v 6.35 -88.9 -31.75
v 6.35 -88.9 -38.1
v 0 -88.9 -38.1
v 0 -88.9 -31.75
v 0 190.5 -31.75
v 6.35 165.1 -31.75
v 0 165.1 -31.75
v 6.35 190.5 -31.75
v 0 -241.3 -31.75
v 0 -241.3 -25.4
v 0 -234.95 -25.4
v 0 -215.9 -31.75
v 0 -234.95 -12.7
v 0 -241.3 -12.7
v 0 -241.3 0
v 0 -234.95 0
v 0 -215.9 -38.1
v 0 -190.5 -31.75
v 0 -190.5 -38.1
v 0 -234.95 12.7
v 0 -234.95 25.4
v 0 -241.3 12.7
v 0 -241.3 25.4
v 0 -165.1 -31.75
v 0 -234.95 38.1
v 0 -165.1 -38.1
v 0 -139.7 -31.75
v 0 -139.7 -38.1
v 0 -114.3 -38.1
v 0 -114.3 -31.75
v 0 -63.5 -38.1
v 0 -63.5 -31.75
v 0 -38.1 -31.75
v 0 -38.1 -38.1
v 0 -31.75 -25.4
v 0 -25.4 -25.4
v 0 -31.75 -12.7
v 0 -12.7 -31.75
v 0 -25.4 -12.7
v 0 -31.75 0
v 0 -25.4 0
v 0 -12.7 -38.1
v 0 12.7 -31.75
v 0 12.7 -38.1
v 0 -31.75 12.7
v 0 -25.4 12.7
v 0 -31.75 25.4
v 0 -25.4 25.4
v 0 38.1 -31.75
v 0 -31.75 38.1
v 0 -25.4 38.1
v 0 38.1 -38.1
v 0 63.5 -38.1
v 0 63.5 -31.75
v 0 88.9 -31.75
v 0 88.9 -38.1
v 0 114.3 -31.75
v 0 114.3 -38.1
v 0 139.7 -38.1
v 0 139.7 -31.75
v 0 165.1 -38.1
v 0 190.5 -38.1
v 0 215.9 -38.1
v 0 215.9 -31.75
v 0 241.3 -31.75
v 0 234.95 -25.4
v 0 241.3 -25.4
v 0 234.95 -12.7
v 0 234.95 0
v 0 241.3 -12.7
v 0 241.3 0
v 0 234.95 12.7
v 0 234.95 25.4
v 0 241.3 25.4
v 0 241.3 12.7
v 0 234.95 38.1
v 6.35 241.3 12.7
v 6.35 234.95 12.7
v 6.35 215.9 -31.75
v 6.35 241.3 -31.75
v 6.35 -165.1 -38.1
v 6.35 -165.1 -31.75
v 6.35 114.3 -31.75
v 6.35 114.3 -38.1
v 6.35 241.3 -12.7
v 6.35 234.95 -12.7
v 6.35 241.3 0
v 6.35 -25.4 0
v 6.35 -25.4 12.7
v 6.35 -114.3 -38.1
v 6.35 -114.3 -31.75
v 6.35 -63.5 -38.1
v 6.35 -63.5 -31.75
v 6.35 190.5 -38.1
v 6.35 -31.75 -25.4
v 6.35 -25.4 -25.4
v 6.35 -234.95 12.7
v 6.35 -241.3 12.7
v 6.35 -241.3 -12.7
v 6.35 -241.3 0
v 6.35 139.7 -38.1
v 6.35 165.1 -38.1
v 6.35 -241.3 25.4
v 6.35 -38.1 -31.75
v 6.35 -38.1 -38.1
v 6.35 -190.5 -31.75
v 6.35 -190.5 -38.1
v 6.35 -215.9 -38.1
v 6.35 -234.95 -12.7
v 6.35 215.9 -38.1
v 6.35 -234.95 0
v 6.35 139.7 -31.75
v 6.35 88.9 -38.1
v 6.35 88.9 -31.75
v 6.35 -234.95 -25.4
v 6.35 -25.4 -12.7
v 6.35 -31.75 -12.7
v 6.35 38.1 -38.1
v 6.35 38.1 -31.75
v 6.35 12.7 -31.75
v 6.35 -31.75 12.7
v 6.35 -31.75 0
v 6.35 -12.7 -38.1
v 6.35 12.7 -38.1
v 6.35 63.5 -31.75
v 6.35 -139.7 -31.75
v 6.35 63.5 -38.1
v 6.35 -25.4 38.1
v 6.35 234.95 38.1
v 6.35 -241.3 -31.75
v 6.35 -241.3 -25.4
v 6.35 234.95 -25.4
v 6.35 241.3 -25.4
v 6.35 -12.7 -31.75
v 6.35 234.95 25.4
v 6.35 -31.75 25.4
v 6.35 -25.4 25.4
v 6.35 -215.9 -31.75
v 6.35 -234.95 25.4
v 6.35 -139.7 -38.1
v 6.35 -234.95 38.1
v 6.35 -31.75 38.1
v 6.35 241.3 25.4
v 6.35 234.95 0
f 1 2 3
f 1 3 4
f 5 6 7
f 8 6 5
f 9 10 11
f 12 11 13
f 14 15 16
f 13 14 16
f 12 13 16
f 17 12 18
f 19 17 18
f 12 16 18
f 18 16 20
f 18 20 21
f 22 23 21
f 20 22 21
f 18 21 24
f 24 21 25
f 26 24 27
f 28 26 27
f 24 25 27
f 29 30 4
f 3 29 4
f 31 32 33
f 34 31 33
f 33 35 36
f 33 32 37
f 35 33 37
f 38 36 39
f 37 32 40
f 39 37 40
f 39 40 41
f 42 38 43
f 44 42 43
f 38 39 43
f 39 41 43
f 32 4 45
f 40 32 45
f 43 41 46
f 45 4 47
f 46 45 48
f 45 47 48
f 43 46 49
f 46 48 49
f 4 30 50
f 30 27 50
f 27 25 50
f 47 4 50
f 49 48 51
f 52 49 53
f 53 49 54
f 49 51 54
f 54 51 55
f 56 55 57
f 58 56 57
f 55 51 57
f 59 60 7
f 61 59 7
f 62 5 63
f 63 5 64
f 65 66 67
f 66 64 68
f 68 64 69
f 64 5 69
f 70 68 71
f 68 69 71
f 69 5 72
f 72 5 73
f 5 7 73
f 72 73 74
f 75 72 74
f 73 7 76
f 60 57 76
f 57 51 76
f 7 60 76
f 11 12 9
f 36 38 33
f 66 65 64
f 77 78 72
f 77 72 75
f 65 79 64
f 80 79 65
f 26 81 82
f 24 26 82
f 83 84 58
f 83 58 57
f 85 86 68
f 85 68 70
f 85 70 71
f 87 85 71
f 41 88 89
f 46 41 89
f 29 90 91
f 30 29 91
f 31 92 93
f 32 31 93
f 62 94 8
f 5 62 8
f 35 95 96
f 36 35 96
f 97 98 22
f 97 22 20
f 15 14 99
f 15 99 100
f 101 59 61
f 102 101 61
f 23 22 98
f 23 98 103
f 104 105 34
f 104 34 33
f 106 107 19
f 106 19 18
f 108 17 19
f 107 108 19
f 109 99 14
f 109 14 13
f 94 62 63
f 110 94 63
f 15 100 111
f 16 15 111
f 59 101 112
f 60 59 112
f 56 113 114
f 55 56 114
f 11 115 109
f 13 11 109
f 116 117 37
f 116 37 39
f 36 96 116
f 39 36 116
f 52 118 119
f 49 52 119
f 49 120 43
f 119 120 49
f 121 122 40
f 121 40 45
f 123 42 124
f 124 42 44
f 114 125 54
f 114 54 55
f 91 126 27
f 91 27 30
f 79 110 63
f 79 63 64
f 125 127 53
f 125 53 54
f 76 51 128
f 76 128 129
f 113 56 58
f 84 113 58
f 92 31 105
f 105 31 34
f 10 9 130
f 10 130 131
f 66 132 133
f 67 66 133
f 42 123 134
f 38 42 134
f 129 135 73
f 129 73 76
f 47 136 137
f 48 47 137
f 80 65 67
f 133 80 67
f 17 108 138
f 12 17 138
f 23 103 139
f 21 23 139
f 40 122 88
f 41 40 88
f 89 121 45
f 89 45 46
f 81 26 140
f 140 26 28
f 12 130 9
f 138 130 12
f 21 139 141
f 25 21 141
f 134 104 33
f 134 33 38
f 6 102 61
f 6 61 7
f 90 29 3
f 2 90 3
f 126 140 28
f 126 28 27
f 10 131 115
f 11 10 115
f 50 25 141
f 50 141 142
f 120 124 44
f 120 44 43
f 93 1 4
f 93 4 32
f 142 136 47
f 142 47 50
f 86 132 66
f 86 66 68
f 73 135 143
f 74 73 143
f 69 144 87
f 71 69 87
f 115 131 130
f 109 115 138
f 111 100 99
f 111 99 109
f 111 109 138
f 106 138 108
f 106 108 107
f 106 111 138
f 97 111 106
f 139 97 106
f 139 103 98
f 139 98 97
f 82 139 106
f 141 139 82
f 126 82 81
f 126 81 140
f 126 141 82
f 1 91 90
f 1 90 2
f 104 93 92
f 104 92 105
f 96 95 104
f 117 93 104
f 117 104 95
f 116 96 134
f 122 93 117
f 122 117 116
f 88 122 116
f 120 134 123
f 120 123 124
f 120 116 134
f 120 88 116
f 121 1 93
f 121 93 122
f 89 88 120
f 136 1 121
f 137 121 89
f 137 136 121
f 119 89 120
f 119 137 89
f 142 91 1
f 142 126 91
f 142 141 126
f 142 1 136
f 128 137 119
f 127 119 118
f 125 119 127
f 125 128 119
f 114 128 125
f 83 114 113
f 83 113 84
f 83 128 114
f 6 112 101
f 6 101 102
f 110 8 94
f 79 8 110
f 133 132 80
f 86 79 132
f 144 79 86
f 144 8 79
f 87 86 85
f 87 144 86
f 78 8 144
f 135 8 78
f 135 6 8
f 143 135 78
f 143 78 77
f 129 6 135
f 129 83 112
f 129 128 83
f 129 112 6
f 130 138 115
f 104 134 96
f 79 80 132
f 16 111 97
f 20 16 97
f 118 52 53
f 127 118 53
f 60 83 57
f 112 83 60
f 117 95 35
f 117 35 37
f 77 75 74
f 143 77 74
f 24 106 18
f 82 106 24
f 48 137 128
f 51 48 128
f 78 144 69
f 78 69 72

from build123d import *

# Parameters (mm, degrees)
F0_W     = 482.6
F0_H     = 76.2
F1_DEPTH = 6.35
F2_W     = 25.4
F2_H     = 6.35
F3_DEPTH = 6.35
F4_W     = 6.35
F4_H     = 12.7
F5_DEPTH = 6.35


with BuildPart() as f1:
    # F0 (on Right) → F1 (new body)
    with BuildSketch(Plane.YZ):
        Rectangle(F0_W, F0_H)
    extrude(amount=F1_DEPTH)

    # F2 (on face) → F3 (cut, through all)
    with BuildSketch(Plane.YZ.offset(6.35)):
        with Locations((-228.6, -34.925)):
            Rectangle(F2_W, F2_H)
        with Locations((-177.8, -34.925)):
            Rectangle(F2_W, F2_H)
        with Locations((-127, -34.925)):
            Rectangle(F2_W, F2_H)
        with Locations((-76.2, -34.925)):
            Rectangle(F2_W, F2_H)
        with Locations((-25.4, -34.925)):
            Rectangle(F2_W, F2_H)
        with Locations((25.4, -34.925)):
            Rectangle(F2_W, F2_H)
        with Locations((76.2, -34.925)):
            Rectangle(F2_W, F2_H)
        with Locations((127, -34.925)):
            Rectangle(F2_W, F2_H)
        with Locations((177.8, -34.925)):
            Rectangle(F2_W, F2_H)
        with Locations((228.6, -34.925)):
            Rectangle(F2_W, F2_H)
    extrude(amount=-F3_DEPTH, mode=Mode.SUBTRACT)

    # F4 (on face) → F5 (cut, through all)
    with BuildSketch(Plane.YZ.offset(6.35)):
        with Locations((-238.125, 31.75)):
            Rectangle(F4_W, F4_H)
        with Locations((-238.125, 6.35)):
            Rectangle(F4_W, F4_H)
        with Locations((-238.125, -19.05)):
            Rectangle(F4_W, F4_H)
        with Locations((-28.575, 31.75)):
            Rectangle(F4_W, F4_H)
        with Locations((-28.575, 6.35)):
            Rectangle(F4_W, F4_H)
        with Locations((-28.575, -19.05)):
            Rectangle(F4_W, F4_H)
        with Locations((238.125, 31.75)):
            Rectangle(F4_W, F4_H)
        with Locations((238.125, 6.35)):
            Rectangle(F4_W, F4_H)
        with Locations((238.125, -19.05)):
            Rectangle(F4_W, F4_H)
    extrude(amount=-F5_DEPTH, mode=Mode.SUBTRACT)


solid = f1.part
